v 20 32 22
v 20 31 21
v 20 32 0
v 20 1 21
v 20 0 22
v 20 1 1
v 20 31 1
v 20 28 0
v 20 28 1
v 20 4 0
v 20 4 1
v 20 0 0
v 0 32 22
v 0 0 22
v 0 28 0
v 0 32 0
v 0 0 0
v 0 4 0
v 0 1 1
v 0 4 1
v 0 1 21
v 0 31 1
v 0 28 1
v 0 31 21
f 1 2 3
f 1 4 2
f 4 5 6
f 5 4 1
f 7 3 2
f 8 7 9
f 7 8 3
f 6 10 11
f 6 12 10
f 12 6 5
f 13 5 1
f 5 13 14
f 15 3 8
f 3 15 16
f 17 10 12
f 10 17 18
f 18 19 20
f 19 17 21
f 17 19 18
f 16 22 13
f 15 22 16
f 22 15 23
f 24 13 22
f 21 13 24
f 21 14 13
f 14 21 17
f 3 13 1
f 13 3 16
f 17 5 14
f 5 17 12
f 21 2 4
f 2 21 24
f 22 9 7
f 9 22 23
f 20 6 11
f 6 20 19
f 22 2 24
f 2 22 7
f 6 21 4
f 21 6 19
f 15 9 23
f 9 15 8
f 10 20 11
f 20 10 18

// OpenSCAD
ml_up_depth=30;
ml_up_heigth=20;
ml_up_thickness=2;

ml_h_width=20; 
ml_h_thickness=1;


module lamp_clip(width) {
    difference() {

        // Outer shape
        cube([width, ml_up_depth + ml_h_thickness * 2, ml_up_heigth + ml_h_thickness * 2]);

        // cutout
        translate([-1, ml_h_thickness, ml_h_thickness])
        cube([width + 2, ml_up_depth, ml_up_heigth]);

        //Cut out the lower part of the clip
        color("red")
        translate([-1, ml_up_thickness+2, -1])
        cube([width + 2, ml_up_depth - ml_up_thickness - 4, ml_h_thickness + 2]);
    }
}

lamp_clip(ml_h_width);
